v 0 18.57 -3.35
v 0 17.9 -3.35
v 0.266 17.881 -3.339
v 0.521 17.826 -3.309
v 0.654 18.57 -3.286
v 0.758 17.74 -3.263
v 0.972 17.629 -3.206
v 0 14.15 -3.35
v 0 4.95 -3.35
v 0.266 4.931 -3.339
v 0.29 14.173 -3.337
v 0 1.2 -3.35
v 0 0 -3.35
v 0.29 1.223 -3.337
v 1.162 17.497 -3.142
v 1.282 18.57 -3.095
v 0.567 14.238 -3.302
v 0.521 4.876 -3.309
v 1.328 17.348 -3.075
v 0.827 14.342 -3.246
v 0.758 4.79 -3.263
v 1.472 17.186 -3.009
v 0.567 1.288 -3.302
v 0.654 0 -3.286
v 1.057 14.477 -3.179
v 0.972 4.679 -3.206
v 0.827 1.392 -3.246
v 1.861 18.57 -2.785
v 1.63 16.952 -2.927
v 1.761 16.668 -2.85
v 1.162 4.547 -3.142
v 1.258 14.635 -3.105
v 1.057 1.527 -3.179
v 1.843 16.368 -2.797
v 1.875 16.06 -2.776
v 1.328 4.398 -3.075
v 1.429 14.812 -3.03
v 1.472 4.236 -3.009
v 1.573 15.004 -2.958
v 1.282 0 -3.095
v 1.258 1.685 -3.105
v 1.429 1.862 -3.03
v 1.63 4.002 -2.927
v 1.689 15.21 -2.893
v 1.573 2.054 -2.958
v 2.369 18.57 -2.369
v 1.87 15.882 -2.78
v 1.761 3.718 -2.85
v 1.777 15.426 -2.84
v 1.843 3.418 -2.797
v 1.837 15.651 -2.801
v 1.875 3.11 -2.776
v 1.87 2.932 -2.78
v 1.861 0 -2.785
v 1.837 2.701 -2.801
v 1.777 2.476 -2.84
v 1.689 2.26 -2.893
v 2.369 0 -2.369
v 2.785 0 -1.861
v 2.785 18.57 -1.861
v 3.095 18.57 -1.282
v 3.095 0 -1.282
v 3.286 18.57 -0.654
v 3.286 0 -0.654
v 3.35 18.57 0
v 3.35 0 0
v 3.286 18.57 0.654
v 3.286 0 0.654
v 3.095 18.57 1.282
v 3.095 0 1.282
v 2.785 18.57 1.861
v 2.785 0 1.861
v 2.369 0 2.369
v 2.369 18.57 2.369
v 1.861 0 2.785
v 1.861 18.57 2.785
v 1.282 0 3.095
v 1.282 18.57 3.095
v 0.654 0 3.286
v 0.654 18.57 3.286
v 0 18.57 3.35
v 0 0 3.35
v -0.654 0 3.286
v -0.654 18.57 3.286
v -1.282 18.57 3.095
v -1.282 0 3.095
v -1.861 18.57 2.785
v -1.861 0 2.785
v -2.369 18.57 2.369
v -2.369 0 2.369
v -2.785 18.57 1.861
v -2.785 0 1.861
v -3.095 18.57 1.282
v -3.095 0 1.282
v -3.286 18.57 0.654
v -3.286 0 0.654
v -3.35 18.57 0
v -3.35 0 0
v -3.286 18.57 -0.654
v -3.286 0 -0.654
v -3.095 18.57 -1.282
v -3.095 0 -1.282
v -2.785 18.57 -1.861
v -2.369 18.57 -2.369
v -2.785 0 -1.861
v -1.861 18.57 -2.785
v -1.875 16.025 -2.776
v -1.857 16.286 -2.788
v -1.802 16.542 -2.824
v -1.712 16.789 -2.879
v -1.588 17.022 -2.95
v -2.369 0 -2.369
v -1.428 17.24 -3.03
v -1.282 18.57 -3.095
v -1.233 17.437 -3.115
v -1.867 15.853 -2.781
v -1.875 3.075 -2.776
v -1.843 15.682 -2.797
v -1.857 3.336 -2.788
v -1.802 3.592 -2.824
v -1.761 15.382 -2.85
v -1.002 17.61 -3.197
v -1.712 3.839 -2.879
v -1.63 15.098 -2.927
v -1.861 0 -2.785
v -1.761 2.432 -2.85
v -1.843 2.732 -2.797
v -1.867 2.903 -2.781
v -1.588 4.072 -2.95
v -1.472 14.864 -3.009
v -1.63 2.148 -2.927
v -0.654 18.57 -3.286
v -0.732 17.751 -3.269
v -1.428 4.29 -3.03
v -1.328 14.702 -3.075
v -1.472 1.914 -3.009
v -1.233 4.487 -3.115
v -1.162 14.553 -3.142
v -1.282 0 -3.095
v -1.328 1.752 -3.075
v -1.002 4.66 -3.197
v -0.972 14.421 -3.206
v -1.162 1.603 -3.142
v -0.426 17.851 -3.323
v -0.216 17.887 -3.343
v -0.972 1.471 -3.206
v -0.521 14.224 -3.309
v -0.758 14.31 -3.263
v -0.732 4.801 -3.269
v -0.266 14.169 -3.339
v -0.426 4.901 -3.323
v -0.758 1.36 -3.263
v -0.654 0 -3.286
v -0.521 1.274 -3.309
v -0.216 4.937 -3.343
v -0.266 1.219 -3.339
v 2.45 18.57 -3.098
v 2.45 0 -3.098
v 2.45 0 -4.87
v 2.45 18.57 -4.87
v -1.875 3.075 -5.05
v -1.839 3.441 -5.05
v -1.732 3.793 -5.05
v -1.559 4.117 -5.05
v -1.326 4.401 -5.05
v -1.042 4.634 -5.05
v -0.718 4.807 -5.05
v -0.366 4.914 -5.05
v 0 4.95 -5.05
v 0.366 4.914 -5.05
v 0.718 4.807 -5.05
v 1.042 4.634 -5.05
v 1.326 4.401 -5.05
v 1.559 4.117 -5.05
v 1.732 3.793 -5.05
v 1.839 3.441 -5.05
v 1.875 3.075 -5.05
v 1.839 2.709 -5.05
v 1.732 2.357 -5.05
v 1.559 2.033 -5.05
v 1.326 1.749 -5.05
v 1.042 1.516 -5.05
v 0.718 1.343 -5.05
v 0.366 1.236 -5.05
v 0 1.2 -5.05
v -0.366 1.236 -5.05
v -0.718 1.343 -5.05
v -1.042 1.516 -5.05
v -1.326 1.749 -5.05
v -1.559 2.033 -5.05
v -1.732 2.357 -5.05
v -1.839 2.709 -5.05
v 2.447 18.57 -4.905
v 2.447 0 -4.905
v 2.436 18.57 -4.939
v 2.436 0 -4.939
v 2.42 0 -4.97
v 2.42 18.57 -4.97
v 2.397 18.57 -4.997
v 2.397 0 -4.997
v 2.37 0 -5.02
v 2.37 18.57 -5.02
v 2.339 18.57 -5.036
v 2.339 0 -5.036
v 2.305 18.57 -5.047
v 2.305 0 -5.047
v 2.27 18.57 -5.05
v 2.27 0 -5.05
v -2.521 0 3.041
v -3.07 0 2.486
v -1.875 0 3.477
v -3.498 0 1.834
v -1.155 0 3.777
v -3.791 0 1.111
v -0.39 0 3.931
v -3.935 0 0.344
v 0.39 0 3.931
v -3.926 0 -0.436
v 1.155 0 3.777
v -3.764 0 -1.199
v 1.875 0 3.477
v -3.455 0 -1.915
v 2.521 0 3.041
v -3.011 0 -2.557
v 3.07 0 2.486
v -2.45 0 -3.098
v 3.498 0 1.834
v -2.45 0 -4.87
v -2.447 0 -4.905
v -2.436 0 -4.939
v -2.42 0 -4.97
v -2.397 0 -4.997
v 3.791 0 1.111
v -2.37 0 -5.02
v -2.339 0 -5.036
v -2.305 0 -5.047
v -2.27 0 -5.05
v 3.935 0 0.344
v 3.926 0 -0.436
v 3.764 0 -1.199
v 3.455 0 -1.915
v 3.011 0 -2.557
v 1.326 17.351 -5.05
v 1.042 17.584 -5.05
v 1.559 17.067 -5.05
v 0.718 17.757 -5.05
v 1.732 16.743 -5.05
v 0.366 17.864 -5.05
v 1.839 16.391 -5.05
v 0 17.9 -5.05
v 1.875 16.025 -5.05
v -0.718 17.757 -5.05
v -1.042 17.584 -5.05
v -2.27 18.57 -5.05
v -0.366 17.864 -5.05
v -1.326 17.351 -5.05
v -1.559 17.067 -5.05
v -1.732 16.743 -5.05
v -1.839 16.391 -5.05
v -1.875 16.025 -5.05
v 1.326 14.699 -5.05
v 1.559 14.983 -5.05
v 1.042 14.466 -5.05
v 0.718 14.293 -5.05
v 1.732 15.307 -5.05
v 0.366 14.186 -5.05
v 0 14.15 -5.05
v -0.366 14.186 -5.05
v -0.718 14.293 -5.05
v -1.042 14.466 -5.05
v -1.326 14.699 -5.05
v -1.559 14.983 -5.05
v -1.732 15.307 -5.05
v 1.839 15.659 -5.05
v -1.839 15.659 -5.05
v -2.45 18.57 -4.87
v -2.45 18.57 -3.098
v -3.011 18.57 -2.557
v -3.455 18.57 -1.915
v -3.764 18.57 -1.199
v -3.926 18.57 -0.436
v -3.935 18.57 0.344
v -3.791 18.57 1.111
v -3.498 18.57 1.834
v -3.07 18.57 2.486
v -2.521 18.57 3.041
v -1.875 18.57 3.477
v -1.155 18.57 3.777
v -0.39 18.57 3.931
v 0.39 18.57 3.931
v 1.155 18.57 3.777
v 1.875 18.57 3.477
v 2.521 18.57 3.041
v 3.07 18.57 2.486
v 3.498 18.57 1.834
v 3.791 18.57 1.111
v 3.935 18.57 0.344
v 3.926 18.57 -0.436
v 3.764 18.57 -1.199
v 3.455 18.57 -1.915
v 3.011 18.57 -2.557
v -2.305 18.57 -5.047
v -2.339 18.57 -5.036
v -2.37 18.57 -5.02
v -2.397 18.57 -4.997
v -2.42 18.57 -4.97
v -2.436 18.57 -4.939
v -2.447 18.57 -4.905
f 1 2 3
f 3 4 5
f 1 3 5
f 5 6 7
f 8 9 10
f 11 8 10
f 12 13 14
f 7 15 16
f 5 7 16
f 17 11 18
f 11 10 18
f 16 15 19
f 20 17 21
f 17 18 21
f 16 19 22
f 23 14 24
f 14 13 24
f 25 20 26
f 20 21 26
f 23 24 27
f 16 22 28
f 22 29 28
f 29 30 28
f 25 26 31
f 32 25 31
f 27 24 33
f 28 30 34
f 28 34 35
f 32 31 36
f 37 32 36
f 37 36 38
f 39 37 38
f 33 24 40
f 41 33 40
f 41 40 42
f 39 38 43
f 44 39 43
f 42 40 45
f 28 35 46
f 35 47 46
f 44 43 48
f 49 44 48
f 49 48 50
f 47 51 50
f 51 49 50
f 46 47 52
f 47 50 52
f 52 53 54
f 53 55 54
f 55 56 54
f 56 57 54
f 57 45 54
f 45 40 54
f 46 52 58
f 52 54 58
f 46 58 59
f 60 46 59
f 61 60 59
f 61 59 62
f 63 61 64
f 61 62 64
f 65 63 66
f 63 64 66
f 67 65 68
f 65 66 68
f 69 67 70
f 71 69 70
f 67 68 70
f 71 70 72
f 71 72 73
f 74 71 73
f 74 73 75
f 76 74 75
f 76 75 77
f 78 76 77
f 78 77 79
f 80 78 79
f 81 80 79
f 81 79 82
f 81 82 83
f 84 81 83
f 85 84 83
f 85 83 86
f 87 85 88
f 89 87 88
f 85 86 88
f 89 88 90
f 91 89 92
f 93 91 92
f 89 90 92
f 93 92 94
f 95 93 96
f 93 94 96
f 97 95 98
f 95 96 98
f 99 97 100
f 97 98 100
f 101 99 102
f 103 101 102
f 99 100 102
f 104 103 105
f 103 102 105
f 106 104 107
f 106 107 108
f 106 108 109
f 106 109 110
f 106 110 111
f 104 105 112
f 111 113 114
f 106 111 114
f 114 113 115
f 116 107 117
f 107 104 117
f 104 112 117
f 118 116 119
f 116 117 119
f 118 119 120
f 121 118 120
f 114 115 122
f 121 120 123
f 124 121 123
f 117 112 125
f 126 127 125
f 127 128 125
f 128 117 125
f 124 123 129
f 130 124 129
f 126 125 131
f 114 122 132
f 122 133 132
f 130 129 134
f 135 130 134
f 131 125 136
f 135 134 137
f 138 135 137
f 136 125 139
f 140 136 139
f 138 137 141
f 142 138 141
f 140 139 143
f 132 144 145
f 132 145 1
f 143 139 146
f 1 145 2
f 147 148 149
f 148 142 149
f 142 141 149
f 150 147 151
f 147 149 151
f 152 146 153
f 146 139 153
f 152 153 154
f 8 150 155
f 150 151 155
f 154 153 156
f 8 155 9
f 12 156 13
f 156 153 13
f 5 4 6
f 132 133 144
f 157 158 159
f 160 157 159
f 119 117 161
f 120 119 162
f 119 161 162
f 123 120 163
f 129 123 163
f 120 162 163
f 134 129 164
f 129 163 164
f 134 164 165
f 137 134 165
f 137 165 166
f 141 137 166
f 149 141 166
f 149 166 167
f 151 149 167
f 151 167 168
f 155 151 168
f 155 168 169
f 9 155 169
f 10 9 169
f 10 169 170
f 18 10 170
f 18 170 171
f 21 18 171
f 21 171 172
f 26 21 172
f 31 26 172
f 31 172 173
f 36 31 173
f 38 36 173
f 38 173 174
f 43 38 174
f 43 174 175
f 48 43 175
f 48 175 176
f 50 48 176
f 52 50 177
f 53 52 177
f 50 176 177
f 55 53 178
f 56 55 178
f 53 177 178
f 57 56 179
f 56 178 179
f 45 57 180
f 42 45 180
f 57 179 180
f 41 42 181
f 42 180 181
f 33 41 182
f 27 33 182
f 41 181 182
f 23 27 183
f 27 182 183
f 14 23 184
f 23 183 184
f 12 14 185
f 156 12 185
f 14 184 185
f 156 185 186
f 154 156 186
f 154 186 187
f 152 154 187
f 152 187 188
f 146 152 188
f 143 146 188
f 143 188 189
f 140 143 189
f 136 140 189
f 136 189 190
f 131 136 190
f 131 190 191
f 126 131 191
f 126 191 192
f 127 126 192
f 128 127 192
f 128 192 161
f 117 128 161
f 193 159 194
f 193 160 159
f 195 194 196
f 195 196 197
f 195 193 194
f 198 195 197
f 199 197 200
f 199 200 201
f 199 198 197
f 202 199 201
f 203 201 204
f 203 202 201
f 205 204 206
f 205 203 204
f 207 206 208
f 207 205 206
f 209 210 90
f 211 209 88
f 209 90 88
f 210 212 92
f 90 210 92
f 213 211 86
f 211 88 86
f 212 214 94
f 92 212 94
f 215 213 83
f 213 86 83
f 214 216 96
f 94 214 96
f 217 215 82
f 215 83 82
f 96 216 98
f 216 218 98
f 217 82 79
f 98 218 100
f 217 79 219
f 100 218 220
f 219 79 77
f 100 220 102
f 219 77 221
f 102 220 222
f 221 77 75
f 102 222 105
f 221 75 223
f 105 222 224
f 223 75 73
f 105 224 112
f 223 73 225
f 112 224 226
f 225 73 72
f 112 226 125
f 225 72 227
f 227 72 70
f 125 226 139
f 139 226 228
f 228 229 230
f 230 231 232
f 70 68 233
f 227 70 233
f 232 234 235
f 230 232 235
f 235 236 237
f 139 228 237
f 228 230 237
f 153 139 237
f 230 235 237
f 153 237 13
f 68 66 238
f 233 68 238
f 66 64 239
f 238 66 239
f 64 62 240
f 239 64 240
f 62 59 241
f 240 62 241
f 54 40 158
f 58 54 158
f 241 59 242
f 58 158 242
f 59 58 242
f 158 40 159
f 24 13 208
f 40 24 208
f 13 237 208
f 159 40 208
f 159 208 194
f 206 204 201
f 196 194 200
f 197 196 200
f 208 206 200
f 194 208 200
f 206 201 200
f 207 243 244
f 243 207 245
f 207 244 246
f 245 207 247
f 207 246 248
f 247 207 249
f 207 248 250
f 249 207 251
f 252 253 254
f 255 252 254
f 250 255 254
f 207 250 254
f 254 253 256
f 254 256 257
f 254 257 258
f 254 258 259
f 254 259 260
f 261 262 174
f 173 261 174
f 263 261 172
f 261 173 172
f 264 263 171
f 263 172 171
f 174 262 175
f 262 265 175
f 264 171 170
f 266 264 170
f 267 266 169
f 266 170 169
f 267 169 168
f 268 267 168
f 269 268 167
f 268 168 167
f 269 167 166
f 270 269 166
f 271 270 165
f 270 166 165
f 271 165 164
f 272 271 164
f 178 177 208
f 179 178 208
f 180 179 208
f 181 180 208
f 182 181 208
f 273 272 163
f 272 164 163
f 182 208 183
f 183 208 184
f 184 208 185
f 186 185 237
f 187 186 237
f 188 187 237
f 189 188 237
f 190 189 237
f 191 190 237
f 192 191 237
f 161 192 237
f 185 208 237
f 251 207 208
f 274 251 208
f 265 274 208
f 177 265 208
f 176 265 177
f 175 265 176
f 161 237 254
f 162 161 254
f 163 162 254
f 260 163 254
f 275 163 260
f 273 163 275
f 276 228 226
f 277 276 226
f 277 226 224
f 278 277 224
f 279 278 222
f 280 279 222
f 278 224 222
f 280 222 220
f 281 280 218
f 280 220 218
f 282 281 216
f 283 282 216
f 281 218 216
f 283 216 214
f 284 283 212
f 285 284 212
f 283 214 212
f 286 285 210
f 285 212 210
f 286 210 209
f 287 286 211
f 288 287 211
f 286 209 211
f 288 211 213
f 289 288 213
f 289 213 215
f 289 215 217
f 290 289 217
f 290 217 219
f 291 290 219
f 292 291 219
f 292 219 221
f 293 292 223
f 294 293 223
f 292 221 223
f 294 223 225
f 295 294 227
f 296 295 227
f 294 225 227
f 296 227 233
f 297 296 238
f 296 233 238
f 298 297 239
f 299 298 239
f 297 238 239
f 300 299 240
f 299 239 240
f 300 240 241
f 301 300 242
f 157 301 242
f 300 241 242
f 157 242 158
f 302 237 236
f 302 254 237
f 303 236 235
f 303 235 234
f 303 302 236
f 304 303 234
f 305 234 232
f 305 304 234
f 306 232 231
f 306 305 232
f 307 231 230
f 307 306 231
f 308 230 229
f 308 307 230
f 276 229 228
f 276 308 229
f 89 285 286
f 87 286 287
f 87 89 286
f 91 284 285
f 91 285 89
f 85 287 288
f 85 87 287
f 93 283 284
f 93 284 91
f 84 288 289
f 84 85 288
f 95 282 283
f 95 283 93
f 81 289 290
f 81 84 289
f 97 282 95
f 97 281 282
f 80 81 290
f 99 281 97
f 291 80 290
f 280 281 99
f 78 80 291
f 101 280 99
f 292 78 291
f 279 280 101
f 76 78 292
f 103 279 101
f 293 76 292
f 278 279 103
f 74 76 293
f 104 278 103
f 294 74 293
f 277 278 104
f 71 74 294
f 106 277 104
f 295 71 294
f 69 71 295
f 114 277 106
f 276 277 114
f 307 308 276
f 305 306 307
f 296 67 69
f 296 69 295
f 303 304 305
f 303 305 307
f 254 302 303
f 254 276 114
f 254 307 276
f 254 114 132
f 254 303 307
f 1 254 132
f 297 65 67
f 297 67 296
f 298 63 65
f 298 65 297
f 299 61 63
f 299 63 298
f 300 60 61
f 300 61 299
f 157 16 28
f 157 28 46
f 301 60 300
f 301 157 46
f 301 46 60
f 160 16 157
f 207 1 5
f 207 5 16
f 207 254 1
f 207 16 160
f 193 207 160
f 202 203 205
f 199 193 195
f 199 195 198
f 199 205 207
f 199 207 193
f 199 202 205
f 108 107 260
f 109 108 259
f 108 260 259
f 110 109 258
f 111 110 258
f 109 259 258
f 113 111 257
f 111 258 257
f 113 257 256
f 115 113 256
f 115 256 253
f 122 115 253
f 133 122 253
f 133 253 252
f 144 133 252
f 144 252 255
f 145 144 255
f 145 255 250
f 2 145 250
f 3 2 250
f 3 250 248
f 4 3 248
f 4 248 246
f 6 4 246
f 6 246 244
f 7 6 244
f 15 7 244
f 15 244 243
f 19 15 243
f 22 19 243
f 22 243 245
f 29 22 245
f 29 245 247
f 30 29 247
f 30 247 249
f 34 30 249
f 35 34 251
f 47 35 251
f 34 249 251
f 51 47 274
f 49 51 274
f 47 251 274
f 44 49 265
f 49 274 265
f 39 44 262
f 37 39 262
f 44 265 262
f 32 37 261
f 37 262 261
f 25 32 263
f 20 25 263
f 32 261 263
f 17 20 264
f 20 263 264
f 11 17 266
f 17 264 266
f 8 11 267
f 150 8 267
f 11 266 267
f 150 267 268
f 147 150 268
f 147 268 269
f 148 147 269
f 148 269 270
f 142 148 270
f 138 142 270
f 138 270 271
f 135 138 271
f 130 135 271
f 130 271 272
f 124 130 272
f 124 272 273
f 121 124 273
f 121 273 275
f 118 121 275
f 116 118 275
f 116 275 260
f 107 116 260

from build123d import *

# Parameters (mm, degrees)
BOSS_EXTRUDE1_DEPTH     = 18.57
SKETCH2_R               = 3.35
CUT_EXTRUDE1_DEPTH      = 18.57
CUT_EXTRUDE2_REACH      = 23.011
CUT_EXTRUDE2_END_RADIUS = 3.35
SKETCH3_R               = 1.875
FILLET1_R               = 0.18


with BuildPart() as part:
    # Sketch1 → Boss-Extrude1 (new body)
    with BuildSketch(Plane(origin=(0, 0, 0), x_dir=(1, 0, 0), z_dir=(0, 1, 0))):
        with BuildLine():
            Line((2.45, 3.098386677), (2.45, 5.05))
            Line((2.45, 5.05), (-2.45, 5.05))
            Line((-2.45, 5.05), (-2.45, 3.098386677))
            ThreePointArc((-2.45, 3.098386677), (0, -3.95), (2.45, 3.098386677))
        make_face()
    extrude(amount=BOSS_EXTRUDE1_DEPTH)

    # Sketch2 → Cut-Extrude1 (cut)
    with BuildSketch(Plane.XZ):
        with Locations(Location((0, 0, 0), (0, 0, 270))):
            Circle(SKETCH2_R)
    extrude(amount=-CUT_EXTRUDE1_DEPTH, mode=Mode.SUBTRACT)

    # Cut-Extrude2: up to this cylinder (the profile starts outside it)
    cut_extrude2_end = Plane(origin=(0, 9.55, 0), z_dir=(0, -1, 0)) * Cylinder(CUT_EXTRUDE2_END_RADIUS, 66.672, mode=Mode.PRIVATE)
    # Sketch3 → Cut-Extrude2 (cut, up to the surface)
    with BuildSketch(Plane(origin=(0, 0, -5.05), x_dir=(-1, 0, 0), z_dir=(0, 0, -1)), mode=Mode.PRIVATE) as cut_extrude2_sk1:
        with Locations((0, 16.025)):
            Circle(SKETCH3_R)
    cut_extrude2_tool1 = extrude(cut_extrude2_sk1.sketch, amount=-CUT_EXTRUDE2_REACH, mode=Mode.PRIVATE) - cut_extrude2_end
    add(cut_extrude2_tool1.solids().sort_by_distance((0, 16.025, -5.05))[0], mode=Mode.SUBTRACT)
    # Sketch3 → Cut-Extrude2 (cut, up to the surface)
    with BuildSketch(Plane(origin=(0, 0, -5.05), x_dir=(-1, 0, 0), z_dir=(0, 0, -1)), mode=Mode.PRIVATE) as cut_extrude2_sk2:
        with Locations((0, 3.075)):
            Circle(SKETCH3_R)
    cut_extrude2_tool2 = extrude(cut_extrude2_sk2.sketch, amount=-CUT_EXTRUDE2_REACH, mode=Mode.PRIVATE) - cut_extrude2_end
    add(cut_extrude2_tool2.solids().sort_by_distance((0, 3.075, -5.05))[0], mode=Mode.SUBTRACT)

    # Fillet1
    fillet1_edges = [part.edges().sort_by_distance(p)[0] for p in [
        (-2.45, 9.285, -5.05),
        (2.45, 9.285, -5.05),
    ]]
    fillet(fillet1_edges, radius=FILLET1_R)


solid = part.part
